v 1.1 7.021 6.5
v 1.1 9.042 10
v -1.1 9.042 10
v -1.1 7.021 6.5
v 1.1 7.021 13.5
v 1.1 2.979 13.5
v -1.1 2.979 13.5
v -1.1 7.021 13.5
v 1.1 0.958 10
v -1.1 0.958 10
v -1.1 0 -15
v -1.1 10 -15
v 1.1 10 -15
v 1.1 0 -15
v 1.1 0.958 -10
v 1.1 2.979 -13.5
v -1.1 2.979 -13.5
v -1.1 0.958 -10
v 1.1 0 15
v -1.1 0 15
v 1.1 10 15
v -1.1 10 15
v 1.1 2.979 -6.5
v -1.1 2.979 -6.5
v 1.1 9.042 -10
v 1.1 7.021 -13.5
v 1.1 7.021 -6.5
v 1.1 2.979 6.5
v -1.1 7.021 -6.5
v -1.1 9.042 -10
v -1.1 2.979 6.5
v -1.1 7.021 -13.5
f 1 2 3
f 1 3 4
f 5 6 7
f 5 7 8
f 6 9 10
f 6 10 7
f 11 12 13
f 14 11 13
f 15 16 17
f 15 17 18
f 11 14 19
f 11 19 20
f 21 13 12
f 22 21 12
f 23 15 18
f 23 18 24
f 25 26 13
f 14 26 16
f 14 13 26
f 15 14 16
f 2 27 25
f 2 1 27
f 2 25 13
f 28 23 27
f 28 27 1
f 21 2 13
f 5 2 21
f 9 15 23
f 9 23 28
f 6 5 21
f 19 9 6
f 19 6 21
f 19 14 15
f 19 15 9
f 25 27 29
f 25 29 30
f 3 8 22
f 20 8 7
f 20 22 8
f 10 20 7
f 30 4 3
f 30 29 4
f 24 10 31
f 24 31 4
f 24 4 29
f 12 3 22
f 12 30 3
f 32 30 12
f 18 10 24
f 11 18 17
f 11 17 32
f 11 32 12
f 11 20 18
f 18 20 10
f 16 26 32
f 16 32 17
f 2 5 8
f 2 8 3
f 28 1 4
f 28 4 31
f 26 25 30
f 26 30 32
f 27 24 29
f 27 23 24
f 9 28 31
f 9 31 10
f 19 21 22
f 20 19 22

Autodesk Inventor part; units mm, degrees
ref_plane "YZ Plane" through (0, 0, 0) normal (1, 0, 0) x (0, 1, 0)
ref_plane "XZ Plane" through (0, 0, 0) normal (0, 1, 0) x (-1, 0, 0)
ref_plane "XY Plane" through (0, 0, 0) normal (0, 0, 1) x (1, 0, 0)
sketch "Sketch1" plane through (0, 0, 0) normal (0, 1, 0) x (-1, 0, 0)
  line L0 (-1.1, 15) -> (1.1, 15)
  line L1 (1.1, 15) -> (1.1, -15)
  line L2 (1.1, -15) -> (-1.1, -15)
  line L3 (-1.1, -15) -> (-1.1, 15)
  line L4 (-1.1, 15) -> (1.1, -15) construction
  line L5 (1.1, 15) -> (-1.1, -15) construction
  point P0 (0, 0)
  dimension "d0" = 2.2
  dimension "d1" = 30
extrude "Extrusion1" add sketch "Sketch1" along normal blind 10
sketch "Sketch4" plane through (1.1, 0, 15) normal (1, 0, 0) x (0, 0, -1)
  line L0 (0, 0) -> (0, 10) projected
  line L1 (0, 5) -> (5, 5)
  line L2 (30, 0) -> (30, 10) projected
  line L3 (30, 5) -> (25, 5)
  line L4 (5, 9.0415) -> (8.5, 7.0207)
  line L5 (8.5, 7.0207) -> (8.5, 2.9793)
  line L6 (8.5, 2.9793) -> (5, 0.9585)
  line L7 (5, 0.9585) -> (1.5, 2.9793)
  line L8 (1.5, 2.9793) -> (1.5, 7.0207)
  line L9 (1.5, 7.0207) -> (5, 9.0415)
  line L10 (25, 9.0415) -> (28.5, 7.0207)
  line L11 (28.5, 7.0207) -> (28.5, 2.9793)
  line L12 (28.5, 2.9793) -> (25, 0.9585)
  line L13 (25, 0.9585) -> (21.5, 2.9793)
  line L14 (21.5, 2.9793) -> (21.5, 7.0207)
  line L15 (21.5, 7.0207) -> (25, 9.0415)
  point P0 (15, 0)
  point P1 (28.5, 5)
  point P2 (21.5, 5)
  dimension "d18" = 5
  dimension "d19" = 5
  dimension "d20" = 7
  dimension "d21" = 7
extrude "Extrusion3" cut sketch "Sketch4" against normal blind 2.2
properties part number "Pengunci sendok - mur"
